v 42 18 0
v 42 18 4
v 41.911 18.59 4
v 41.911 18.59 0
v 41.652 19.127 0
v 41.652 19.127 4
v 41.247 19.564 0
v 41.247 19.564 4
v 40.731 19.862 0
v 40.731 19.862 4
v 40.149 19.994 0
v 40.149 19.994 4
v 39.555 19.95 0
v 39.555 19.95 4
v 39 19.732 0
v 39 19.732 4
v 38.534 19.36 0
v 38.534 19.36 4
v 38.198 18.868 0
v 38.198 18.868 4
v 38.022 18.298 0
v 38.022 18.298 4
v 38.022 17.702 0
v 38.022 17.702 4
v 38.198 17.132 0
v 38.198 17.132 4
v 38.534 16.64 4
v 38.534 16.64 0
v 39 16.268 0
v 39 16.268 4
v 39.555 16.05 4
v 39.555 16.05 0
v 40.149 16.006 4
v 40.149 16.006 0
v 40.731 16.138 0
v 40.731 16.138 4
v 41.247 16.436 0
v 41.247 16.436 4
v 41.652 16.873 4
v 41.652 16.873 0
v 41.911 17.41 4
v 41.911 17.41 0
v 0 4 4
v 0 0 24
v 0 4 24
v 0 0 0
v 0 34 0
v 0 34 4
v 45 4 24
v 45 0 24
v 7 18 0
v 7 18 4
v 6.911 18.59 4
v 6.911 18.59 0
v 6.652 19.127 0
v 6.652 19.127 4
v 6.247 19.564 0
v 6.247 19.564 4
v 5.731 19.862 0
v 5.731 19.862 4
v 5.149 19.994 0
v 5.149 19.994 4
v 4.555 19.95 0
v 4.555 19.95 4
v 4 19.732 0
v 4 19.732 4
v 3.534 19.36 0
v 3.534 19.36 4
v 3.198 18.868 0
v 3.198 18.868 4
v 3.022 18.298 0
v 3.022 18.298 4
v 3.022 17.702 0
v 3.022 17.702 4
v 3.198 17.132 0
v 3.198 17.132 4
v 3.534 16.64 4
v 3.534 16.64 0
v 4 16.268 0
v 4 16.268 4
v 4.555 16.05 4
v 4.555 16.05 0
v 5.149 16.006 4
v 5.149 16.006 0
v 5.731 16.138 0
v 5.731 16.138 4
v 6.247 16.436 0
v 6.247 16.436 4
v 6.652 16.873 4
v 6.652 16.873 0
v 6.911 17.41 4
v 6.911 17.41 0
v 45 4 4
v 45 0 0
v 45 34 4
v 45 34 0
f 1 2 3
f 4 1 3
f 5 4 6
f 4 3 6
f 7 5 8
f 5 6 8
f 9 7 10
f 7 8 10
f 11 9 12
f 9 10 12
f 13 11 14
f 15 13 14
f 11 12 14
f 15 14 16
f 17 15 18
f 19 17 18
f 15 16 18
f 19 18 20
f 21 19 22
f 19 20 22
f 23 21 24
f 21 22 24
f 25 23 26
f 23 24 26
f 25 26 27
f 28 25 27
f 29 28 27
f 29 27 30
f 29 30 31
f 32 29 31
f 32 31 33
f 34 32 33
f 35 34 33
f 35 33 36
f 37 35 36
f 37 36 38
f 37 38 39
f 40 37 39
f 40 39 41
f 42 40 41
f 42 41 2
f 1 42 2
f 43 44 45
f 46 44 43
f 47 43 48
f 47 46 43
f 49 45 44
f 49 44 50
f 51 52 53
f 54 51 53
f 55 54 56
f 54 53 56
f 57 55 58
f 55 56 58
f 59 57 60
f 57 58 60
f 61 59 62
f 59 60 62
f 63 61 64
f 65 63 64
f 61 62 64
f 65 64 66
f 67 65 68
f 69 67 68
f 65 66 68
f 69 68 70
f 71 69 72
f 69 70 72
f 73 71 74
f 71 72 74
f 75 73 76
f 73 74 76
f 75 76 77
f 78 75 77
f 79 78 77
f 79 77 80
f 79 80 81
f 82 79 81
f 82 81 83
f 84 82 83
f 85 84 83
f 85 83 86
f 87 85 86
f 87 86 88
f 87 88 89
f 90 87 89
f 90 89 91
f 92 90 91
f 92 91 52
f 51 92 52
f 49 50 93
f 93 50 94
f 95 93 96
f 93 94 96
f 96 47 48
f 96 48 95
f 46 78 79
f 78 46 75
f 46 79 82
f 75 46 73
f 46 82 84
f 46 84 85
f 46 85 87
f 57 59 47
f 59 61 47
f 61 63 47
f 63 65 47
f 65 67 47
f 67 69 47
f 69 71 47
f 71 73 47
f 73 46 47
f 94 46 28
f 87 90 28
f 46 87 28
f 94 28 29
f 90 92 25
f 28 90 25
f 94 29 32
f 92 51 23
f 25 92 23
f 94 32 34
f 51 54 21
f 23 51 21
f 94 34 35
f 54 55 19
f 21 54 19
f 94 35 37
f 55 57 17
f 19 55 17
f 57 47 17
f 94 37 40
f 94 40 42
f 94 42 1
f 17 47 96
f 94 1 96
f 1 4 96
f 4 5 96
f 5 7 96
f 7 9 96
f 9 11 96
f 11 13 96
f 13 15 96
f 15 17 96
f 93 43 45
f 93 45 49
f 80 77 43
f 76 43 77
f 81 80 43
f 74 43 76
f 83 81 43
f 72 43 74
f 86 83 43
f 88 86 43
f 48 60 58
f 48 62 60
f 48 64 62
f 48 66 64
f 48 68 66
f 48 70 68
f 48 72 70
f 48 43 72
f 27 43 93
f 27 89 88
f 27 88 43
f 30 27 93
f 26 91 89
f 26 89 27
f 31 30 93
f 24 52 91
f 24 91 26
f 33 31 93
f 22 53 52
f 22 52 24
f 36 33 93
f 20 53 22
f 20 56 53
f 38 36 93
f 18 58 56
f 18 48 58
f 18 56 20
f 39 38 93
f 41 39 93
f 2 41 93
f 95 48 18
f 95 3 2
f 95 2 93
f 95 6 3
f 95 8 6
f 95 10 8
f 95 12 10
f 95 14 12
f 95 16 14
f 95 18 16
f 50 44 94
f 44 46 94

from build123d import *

# Parameters (mm, degrees)
SKETCH1_W           = 45
SKETCH1_H           = 34
BOSS_EXTRUDE1_DEPTH = 4
SKETCH2_W           = 45
SKETCH2_H           = 4
BOSS_EXTRUDE2_DEPTH = 20
SKETCH3_R           = 2
CUT_EXTRUDE1_DEPTH  = 10


with BuildPart() as part:
    # Sketch1 → Boss-Extrude1 (new body)
    with BuildSketch(Plane.XY):
        with Locations((22.5, 17)):
            Rectangle(SKETCH1_W, SKETCH1_H)
    extrude(amount=BOSS_EXTRUDE1_DEPTH)

    # Sketch2 → Boss-Extrude2 (add)
    with BuildSketch(Plane.XY.offset(4)):
        with Locations((22.5, 2)):
            Rectangle(SKETCH2_W, SKETCH2_H)
    extrude(amount=BOSS_EXTRUDE2_DEPTH)

    # Sketch3 → Cut-Extrude1 (cut)
    with BuildSketch(Plane.XY.offset(4)):
        with Locations((5, 18)):
            Circle(SKETCH3_R)
        with Locations((40, 18)):
            Circle(SKETCH3_R)
    extrude(amount=-CUT_EXTRUDE1_DEPTH, mode=Mode.SUBTRACT)


solid = part.part
